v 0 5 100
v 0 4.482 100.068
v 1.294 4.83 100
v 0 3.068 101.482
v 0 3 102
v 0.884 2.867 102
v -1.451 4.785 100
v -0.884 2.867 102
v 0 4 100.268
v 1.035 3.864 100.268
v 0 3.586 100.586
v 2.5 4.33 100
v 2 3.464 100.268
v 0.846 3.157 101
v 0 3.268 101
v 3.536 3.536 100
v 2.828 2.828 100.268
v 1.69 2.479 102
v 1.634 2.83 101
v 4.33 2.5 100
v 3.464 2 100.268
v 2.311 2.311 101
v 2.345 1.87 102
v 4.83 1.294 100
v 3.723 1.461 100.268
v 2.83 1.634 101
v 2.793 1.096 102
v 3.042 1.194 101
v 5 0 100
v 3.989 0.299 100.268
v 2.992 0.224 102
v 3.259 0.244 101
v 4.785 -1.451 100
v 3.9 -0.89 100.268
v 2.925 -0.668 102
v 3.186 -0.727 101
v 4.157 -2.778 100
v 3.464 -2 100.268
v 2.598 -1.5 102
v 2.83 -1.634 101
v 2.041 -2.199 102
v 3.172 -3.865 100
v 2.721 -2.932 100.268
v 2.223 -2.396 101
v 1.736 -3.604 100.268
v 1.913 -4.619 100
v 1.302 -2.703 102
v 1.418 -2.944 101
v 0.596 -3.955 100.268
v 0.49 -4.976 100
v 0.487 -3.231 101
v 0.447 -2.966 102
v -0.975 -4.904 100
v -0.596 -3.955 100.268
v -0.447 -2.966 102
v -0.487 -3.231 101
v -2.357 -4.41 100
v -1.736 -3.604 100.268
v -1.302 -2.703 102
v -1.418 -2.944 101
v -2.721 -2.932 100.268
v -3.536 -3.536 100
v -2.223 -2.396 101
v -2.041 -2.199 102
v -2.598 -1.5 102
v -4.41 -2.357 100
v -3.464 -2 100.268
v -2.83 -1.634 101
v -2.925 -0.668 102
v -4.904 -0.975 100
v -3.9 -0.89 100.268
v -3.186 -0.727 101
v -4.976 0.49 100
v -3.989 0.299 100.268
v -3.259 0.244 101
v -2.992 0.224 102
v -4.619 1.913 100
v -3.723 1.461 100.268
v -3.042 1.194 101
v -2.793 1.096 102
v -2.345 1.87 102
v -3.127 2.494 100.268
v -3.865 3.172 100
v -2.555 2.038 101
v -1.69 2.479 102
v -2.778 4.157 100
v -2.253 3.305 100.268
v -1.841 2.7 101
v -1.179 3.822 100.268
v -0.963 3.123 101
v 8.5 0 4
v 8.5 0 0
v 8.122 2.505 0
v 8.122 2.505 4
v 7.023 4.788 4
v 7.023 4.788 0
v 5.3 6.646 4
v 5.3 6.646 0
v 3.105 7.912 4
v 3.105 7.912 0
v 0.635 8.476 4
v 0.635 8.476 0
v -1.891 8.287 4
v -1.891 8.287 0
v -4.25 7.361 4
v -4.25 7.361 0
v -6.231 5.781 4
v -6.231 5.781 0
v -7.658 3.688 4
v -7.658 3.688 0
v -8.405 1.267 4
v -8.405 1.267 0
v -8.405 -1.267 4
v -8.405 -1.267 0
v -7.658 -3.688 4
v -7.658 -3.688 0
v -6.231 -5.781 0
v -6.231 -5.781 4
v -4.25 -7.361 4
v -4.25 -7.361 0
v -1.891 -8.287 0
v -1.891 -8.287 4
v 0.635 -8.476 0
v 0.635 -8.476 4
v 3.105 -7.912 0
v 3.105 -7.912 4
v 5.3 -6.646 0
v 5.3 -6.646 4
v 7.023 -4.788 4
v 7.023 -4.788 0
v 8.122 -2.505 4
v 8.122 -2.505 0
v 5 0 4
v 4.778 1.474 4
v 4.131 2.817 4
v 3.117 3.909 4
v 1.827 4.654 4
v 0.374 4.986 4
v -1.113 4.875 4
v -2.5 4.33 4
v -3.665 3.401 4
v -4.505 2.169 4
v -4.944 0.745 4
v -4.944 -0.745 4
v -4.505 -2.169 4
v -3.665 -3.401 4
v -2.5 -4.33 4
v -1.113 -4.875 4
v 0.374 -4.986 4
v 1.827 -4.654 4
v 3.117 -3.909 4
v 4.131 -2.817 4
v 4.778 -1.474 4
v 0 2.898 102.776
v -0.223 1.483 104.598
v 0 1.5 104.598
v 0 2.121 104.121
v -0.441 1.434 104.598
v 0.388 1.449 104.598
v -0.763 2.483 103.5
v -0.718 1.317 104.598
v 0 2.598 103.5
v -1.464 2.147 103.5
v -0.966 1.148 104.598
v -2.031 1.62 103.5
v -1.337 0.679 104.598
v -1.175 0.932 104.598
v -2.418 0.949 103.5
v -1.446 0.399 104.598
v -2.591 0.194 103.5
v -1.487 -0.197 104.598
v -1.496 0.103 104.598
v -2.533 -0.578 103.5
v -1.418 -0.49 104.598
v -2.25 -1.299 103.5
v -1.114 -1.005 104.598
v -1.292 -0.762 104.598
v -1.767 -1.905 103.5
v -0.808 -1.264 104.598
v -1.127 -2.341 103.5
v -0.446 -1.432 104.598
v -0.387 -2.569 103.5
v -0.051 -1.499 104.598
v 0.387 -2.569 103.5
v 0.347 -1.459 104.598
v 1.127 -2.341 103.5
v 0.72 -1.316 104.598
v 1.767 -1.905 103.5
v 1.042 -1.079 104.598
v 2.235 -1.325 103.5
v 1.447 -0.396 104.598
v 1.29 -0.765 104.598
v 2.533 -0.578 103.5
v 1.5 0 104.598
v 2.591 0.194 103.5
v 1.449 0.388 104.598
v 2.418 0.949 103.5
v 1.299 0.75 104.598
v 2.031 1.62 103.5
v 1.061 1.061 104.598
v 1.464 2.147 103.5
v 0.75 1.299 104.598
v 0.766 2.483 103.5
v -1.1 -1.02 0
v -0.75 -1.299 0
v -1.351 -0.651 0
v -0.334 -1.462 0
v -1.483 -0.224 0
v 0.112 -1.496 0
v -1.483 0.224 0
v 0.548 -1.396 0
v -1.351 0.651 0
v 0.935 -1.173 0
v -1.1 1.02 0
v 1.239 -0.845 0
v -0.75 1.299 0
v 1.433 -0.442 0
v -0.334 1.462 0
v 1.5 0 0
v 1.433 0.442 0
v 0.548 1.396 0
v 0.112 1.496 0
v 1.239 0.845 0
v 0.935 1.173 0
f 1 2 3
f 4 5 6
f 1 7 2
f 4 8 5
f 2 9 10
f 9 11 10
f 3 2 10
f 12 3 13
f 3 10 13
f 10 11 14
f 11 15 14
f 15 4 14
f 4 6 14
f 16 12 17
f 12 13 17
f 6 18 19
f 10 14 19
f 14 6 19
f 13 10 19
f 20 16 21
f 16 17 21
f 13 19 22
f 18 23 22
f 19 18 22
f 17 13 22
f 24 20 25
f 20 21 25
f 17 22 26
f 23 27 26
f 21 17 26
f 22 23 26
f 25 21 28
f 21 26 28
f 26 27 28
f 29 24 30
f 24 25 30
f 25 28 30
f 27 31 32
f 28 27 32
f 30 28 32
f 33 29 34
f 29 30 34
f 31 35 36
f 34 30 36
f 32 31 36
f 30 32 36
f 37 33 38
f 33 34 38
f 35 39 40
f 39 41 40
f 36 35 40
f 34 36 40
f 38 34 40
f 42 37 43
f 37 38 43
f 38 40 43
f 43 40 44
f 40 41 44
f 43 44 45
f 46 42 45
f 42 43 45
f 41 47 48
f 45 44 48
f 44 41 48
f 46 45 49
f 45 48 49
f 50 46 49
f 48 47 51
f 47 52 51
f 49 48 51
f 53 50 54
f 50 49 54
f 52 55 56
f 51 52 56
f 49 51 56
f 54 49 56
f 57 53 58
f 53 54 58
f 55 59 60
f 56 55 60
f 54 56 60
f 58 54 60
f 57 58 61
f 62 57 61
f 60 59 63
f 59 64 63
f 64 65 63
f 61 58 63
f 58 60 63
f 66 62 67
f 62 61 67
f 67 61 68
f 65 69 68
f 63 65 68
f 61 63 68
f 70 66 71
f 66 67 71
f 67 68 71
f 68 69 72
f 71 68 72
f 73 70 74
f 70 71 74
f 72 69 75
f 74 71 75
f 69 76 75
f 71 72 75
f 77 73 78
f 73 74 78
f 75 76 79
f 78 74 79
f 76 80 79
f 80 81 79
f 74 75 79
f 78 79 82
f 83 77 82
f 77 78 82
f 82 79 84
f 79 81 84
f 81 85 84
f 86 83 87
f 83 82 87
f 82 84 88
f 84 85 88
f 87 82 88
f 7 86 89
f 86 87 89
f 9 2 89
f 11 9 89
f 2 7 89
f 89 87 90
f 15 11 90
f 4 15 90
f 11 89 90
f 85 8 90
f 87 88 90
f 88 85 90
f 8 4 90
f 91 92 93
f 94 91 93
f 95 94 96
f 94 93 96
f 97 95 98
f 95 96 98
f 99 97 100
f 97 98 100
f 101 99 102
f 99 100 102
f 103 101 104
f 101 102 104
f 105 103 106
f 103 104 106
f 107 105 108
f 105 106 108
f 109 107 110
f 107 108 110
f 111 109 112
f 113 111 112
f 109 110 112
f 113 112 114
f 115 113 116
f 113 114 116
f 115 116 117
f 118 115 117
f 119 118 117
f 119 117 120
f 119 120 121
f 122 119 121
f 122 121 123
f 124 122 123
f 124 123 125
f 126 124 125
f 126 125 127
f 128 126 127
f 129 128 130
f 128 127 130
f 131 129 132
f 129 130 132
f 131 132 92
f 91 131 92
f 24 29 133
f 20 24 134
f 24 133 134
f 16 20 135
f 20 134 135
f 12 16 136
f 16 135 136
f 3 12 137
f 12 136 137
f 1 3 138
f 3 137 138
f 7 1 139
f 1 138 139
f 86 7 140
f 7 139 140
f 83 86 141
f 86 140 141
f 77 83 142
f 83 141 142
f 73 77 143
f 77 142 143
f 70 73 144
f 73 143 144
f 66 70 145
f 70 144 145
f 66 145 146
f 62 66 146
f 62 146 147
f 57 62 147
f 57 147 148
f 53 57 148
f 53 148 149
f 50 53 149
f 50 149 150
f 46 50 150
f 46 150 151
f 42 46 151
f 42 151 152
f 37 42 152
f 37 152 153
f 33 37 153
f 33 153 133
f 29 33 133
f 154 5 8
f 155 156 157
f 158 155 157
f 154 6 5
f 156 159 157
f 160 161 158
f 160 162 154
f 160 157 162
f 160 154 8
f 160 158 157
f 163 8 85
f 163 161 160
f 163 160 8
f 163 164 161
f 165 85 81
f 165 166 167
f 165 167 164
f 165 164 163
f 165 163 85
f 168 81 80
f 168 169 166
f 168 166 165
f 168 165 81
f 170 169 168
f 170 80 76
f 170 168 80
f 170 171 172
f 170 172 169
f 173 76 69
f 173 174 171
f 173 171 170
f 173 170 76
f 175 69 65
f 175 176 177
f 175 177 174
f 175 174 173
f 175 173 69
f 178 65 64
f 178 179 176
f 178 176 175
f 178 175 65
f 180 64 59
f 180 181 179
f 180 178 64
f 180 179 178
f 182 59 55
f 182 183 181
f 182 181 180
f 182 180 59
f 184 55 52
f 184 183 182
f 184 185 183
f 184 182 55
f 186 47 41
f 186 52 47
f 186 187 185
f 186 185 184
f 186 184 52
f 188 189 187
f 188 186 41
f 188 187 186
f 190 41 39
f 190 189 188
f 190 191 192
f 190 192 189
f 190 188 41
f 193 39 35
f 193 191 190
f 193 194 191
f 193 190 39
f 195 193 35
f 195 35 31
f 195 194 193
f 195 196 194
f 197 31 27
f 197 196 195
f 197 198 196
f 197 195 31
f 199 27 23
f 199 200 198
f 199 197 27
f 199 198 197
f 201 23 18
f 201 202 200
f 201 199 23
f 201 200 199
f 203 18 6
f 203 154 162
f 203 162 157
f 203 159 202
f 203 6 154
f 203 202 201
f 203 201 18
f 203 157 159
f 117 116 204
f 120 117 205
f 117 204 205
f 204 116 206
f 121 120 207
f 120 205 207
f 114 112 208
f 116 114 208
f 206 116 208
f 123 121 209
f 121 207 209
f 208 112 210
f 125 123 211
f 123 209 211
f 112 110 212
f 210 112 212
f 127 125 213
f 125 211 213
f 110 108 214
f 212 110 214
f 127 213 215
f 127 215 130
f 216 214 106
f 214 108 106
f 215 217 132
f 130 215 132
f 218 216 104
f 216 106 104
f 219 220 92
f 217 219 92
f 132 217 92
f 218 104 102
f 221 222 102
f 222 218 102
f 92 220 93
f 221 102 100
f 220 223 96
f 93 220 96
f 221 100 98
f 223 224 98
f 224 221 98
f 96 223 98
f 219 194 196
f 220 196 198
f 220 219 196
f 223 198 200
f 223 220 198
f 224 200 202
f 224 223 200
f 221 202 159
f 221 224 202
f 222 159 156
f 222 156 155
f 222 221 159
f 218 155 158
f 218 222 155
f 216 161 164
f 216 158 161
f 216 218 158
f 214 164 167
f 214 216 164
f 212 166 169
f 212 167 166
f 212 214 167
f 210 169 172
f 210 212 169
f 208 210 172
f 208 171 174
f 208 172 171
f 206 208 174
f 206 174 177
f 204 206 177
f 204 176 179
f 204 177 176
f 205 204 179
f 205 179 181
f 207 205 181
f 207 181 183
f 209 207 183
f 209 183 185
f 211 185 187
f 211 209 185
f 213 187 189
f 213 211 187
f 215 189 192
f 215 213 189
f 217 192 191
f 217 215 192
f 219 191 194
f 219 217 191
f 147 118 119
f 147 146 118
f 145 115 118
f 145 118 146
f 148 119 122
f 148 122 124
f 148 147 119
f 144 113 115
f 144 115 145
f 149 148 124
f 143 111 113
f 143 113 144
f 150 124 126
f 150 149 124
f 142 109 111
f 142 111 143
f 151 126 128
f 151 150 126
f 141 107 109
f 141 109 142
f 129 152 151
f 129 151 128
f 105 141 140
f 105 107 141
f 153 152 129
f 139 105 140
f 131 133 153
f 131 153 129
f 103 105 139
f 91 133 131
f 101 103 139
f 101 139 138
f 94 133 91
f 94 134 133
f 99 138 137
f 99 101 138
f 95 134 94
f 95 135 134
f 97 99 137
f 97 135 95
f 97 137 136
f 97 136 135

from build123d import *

# Parameters (mm, degrees)
F0_R     = 8.5
F1_DEPTH = 4
F2_R     = 5
F3_DEPTH = 100
F8_R     = 1.5
F9_DEPTH = 109.5


with BuildPart() as f1:
    # F0 (on Top) → F1 (new body)
    with BuildSketch(Plane.XY):
        Circle(F0_R)
    extrude(amount=F1_DEPTH)

    # F2 (on Top) → F3 (join)
    with BuildSketch(Plane.XY):
        Circle(F2_R)
    extrude(amount=F3_DEPTH)

    # F4 (on Right) → F5 (revolve)
    with BuildSketch(Plane.YZ):
        with BuildLine():
            Line((3, 102), (0, 102))
            Line((0, 102), (0, 100))
            Line((0, 100), (5, 100))
            ThreePointArc((5, 100), (3.585786, 100.585786), (3, 102))
        make_face()
    revolve(axis=Axis((0, 0, 101), (0, 0, -1)))

    # F6 (on Right) → F7 (revolve)
    with BuildSketch(Plane.YZ):
        with BuildLine():
            Line((0, 105), (0, 102))
            Line((0, 102), (3, 102))
            ThreePointArc((3, 102), (2.12132, 104.12132), (0, 105))
        make_face()
    revolve(axis=Axis((0, 0, 103.5), (0, 0, 1)))

    # F8 (on Top) → F9 (cut)
    with BuildSketch(Plane.XY):
        Circle(F8_R)
    extrude(amount=F9_DEPTH, mode=Mode.SUBTRACT)


solid = f1.part
